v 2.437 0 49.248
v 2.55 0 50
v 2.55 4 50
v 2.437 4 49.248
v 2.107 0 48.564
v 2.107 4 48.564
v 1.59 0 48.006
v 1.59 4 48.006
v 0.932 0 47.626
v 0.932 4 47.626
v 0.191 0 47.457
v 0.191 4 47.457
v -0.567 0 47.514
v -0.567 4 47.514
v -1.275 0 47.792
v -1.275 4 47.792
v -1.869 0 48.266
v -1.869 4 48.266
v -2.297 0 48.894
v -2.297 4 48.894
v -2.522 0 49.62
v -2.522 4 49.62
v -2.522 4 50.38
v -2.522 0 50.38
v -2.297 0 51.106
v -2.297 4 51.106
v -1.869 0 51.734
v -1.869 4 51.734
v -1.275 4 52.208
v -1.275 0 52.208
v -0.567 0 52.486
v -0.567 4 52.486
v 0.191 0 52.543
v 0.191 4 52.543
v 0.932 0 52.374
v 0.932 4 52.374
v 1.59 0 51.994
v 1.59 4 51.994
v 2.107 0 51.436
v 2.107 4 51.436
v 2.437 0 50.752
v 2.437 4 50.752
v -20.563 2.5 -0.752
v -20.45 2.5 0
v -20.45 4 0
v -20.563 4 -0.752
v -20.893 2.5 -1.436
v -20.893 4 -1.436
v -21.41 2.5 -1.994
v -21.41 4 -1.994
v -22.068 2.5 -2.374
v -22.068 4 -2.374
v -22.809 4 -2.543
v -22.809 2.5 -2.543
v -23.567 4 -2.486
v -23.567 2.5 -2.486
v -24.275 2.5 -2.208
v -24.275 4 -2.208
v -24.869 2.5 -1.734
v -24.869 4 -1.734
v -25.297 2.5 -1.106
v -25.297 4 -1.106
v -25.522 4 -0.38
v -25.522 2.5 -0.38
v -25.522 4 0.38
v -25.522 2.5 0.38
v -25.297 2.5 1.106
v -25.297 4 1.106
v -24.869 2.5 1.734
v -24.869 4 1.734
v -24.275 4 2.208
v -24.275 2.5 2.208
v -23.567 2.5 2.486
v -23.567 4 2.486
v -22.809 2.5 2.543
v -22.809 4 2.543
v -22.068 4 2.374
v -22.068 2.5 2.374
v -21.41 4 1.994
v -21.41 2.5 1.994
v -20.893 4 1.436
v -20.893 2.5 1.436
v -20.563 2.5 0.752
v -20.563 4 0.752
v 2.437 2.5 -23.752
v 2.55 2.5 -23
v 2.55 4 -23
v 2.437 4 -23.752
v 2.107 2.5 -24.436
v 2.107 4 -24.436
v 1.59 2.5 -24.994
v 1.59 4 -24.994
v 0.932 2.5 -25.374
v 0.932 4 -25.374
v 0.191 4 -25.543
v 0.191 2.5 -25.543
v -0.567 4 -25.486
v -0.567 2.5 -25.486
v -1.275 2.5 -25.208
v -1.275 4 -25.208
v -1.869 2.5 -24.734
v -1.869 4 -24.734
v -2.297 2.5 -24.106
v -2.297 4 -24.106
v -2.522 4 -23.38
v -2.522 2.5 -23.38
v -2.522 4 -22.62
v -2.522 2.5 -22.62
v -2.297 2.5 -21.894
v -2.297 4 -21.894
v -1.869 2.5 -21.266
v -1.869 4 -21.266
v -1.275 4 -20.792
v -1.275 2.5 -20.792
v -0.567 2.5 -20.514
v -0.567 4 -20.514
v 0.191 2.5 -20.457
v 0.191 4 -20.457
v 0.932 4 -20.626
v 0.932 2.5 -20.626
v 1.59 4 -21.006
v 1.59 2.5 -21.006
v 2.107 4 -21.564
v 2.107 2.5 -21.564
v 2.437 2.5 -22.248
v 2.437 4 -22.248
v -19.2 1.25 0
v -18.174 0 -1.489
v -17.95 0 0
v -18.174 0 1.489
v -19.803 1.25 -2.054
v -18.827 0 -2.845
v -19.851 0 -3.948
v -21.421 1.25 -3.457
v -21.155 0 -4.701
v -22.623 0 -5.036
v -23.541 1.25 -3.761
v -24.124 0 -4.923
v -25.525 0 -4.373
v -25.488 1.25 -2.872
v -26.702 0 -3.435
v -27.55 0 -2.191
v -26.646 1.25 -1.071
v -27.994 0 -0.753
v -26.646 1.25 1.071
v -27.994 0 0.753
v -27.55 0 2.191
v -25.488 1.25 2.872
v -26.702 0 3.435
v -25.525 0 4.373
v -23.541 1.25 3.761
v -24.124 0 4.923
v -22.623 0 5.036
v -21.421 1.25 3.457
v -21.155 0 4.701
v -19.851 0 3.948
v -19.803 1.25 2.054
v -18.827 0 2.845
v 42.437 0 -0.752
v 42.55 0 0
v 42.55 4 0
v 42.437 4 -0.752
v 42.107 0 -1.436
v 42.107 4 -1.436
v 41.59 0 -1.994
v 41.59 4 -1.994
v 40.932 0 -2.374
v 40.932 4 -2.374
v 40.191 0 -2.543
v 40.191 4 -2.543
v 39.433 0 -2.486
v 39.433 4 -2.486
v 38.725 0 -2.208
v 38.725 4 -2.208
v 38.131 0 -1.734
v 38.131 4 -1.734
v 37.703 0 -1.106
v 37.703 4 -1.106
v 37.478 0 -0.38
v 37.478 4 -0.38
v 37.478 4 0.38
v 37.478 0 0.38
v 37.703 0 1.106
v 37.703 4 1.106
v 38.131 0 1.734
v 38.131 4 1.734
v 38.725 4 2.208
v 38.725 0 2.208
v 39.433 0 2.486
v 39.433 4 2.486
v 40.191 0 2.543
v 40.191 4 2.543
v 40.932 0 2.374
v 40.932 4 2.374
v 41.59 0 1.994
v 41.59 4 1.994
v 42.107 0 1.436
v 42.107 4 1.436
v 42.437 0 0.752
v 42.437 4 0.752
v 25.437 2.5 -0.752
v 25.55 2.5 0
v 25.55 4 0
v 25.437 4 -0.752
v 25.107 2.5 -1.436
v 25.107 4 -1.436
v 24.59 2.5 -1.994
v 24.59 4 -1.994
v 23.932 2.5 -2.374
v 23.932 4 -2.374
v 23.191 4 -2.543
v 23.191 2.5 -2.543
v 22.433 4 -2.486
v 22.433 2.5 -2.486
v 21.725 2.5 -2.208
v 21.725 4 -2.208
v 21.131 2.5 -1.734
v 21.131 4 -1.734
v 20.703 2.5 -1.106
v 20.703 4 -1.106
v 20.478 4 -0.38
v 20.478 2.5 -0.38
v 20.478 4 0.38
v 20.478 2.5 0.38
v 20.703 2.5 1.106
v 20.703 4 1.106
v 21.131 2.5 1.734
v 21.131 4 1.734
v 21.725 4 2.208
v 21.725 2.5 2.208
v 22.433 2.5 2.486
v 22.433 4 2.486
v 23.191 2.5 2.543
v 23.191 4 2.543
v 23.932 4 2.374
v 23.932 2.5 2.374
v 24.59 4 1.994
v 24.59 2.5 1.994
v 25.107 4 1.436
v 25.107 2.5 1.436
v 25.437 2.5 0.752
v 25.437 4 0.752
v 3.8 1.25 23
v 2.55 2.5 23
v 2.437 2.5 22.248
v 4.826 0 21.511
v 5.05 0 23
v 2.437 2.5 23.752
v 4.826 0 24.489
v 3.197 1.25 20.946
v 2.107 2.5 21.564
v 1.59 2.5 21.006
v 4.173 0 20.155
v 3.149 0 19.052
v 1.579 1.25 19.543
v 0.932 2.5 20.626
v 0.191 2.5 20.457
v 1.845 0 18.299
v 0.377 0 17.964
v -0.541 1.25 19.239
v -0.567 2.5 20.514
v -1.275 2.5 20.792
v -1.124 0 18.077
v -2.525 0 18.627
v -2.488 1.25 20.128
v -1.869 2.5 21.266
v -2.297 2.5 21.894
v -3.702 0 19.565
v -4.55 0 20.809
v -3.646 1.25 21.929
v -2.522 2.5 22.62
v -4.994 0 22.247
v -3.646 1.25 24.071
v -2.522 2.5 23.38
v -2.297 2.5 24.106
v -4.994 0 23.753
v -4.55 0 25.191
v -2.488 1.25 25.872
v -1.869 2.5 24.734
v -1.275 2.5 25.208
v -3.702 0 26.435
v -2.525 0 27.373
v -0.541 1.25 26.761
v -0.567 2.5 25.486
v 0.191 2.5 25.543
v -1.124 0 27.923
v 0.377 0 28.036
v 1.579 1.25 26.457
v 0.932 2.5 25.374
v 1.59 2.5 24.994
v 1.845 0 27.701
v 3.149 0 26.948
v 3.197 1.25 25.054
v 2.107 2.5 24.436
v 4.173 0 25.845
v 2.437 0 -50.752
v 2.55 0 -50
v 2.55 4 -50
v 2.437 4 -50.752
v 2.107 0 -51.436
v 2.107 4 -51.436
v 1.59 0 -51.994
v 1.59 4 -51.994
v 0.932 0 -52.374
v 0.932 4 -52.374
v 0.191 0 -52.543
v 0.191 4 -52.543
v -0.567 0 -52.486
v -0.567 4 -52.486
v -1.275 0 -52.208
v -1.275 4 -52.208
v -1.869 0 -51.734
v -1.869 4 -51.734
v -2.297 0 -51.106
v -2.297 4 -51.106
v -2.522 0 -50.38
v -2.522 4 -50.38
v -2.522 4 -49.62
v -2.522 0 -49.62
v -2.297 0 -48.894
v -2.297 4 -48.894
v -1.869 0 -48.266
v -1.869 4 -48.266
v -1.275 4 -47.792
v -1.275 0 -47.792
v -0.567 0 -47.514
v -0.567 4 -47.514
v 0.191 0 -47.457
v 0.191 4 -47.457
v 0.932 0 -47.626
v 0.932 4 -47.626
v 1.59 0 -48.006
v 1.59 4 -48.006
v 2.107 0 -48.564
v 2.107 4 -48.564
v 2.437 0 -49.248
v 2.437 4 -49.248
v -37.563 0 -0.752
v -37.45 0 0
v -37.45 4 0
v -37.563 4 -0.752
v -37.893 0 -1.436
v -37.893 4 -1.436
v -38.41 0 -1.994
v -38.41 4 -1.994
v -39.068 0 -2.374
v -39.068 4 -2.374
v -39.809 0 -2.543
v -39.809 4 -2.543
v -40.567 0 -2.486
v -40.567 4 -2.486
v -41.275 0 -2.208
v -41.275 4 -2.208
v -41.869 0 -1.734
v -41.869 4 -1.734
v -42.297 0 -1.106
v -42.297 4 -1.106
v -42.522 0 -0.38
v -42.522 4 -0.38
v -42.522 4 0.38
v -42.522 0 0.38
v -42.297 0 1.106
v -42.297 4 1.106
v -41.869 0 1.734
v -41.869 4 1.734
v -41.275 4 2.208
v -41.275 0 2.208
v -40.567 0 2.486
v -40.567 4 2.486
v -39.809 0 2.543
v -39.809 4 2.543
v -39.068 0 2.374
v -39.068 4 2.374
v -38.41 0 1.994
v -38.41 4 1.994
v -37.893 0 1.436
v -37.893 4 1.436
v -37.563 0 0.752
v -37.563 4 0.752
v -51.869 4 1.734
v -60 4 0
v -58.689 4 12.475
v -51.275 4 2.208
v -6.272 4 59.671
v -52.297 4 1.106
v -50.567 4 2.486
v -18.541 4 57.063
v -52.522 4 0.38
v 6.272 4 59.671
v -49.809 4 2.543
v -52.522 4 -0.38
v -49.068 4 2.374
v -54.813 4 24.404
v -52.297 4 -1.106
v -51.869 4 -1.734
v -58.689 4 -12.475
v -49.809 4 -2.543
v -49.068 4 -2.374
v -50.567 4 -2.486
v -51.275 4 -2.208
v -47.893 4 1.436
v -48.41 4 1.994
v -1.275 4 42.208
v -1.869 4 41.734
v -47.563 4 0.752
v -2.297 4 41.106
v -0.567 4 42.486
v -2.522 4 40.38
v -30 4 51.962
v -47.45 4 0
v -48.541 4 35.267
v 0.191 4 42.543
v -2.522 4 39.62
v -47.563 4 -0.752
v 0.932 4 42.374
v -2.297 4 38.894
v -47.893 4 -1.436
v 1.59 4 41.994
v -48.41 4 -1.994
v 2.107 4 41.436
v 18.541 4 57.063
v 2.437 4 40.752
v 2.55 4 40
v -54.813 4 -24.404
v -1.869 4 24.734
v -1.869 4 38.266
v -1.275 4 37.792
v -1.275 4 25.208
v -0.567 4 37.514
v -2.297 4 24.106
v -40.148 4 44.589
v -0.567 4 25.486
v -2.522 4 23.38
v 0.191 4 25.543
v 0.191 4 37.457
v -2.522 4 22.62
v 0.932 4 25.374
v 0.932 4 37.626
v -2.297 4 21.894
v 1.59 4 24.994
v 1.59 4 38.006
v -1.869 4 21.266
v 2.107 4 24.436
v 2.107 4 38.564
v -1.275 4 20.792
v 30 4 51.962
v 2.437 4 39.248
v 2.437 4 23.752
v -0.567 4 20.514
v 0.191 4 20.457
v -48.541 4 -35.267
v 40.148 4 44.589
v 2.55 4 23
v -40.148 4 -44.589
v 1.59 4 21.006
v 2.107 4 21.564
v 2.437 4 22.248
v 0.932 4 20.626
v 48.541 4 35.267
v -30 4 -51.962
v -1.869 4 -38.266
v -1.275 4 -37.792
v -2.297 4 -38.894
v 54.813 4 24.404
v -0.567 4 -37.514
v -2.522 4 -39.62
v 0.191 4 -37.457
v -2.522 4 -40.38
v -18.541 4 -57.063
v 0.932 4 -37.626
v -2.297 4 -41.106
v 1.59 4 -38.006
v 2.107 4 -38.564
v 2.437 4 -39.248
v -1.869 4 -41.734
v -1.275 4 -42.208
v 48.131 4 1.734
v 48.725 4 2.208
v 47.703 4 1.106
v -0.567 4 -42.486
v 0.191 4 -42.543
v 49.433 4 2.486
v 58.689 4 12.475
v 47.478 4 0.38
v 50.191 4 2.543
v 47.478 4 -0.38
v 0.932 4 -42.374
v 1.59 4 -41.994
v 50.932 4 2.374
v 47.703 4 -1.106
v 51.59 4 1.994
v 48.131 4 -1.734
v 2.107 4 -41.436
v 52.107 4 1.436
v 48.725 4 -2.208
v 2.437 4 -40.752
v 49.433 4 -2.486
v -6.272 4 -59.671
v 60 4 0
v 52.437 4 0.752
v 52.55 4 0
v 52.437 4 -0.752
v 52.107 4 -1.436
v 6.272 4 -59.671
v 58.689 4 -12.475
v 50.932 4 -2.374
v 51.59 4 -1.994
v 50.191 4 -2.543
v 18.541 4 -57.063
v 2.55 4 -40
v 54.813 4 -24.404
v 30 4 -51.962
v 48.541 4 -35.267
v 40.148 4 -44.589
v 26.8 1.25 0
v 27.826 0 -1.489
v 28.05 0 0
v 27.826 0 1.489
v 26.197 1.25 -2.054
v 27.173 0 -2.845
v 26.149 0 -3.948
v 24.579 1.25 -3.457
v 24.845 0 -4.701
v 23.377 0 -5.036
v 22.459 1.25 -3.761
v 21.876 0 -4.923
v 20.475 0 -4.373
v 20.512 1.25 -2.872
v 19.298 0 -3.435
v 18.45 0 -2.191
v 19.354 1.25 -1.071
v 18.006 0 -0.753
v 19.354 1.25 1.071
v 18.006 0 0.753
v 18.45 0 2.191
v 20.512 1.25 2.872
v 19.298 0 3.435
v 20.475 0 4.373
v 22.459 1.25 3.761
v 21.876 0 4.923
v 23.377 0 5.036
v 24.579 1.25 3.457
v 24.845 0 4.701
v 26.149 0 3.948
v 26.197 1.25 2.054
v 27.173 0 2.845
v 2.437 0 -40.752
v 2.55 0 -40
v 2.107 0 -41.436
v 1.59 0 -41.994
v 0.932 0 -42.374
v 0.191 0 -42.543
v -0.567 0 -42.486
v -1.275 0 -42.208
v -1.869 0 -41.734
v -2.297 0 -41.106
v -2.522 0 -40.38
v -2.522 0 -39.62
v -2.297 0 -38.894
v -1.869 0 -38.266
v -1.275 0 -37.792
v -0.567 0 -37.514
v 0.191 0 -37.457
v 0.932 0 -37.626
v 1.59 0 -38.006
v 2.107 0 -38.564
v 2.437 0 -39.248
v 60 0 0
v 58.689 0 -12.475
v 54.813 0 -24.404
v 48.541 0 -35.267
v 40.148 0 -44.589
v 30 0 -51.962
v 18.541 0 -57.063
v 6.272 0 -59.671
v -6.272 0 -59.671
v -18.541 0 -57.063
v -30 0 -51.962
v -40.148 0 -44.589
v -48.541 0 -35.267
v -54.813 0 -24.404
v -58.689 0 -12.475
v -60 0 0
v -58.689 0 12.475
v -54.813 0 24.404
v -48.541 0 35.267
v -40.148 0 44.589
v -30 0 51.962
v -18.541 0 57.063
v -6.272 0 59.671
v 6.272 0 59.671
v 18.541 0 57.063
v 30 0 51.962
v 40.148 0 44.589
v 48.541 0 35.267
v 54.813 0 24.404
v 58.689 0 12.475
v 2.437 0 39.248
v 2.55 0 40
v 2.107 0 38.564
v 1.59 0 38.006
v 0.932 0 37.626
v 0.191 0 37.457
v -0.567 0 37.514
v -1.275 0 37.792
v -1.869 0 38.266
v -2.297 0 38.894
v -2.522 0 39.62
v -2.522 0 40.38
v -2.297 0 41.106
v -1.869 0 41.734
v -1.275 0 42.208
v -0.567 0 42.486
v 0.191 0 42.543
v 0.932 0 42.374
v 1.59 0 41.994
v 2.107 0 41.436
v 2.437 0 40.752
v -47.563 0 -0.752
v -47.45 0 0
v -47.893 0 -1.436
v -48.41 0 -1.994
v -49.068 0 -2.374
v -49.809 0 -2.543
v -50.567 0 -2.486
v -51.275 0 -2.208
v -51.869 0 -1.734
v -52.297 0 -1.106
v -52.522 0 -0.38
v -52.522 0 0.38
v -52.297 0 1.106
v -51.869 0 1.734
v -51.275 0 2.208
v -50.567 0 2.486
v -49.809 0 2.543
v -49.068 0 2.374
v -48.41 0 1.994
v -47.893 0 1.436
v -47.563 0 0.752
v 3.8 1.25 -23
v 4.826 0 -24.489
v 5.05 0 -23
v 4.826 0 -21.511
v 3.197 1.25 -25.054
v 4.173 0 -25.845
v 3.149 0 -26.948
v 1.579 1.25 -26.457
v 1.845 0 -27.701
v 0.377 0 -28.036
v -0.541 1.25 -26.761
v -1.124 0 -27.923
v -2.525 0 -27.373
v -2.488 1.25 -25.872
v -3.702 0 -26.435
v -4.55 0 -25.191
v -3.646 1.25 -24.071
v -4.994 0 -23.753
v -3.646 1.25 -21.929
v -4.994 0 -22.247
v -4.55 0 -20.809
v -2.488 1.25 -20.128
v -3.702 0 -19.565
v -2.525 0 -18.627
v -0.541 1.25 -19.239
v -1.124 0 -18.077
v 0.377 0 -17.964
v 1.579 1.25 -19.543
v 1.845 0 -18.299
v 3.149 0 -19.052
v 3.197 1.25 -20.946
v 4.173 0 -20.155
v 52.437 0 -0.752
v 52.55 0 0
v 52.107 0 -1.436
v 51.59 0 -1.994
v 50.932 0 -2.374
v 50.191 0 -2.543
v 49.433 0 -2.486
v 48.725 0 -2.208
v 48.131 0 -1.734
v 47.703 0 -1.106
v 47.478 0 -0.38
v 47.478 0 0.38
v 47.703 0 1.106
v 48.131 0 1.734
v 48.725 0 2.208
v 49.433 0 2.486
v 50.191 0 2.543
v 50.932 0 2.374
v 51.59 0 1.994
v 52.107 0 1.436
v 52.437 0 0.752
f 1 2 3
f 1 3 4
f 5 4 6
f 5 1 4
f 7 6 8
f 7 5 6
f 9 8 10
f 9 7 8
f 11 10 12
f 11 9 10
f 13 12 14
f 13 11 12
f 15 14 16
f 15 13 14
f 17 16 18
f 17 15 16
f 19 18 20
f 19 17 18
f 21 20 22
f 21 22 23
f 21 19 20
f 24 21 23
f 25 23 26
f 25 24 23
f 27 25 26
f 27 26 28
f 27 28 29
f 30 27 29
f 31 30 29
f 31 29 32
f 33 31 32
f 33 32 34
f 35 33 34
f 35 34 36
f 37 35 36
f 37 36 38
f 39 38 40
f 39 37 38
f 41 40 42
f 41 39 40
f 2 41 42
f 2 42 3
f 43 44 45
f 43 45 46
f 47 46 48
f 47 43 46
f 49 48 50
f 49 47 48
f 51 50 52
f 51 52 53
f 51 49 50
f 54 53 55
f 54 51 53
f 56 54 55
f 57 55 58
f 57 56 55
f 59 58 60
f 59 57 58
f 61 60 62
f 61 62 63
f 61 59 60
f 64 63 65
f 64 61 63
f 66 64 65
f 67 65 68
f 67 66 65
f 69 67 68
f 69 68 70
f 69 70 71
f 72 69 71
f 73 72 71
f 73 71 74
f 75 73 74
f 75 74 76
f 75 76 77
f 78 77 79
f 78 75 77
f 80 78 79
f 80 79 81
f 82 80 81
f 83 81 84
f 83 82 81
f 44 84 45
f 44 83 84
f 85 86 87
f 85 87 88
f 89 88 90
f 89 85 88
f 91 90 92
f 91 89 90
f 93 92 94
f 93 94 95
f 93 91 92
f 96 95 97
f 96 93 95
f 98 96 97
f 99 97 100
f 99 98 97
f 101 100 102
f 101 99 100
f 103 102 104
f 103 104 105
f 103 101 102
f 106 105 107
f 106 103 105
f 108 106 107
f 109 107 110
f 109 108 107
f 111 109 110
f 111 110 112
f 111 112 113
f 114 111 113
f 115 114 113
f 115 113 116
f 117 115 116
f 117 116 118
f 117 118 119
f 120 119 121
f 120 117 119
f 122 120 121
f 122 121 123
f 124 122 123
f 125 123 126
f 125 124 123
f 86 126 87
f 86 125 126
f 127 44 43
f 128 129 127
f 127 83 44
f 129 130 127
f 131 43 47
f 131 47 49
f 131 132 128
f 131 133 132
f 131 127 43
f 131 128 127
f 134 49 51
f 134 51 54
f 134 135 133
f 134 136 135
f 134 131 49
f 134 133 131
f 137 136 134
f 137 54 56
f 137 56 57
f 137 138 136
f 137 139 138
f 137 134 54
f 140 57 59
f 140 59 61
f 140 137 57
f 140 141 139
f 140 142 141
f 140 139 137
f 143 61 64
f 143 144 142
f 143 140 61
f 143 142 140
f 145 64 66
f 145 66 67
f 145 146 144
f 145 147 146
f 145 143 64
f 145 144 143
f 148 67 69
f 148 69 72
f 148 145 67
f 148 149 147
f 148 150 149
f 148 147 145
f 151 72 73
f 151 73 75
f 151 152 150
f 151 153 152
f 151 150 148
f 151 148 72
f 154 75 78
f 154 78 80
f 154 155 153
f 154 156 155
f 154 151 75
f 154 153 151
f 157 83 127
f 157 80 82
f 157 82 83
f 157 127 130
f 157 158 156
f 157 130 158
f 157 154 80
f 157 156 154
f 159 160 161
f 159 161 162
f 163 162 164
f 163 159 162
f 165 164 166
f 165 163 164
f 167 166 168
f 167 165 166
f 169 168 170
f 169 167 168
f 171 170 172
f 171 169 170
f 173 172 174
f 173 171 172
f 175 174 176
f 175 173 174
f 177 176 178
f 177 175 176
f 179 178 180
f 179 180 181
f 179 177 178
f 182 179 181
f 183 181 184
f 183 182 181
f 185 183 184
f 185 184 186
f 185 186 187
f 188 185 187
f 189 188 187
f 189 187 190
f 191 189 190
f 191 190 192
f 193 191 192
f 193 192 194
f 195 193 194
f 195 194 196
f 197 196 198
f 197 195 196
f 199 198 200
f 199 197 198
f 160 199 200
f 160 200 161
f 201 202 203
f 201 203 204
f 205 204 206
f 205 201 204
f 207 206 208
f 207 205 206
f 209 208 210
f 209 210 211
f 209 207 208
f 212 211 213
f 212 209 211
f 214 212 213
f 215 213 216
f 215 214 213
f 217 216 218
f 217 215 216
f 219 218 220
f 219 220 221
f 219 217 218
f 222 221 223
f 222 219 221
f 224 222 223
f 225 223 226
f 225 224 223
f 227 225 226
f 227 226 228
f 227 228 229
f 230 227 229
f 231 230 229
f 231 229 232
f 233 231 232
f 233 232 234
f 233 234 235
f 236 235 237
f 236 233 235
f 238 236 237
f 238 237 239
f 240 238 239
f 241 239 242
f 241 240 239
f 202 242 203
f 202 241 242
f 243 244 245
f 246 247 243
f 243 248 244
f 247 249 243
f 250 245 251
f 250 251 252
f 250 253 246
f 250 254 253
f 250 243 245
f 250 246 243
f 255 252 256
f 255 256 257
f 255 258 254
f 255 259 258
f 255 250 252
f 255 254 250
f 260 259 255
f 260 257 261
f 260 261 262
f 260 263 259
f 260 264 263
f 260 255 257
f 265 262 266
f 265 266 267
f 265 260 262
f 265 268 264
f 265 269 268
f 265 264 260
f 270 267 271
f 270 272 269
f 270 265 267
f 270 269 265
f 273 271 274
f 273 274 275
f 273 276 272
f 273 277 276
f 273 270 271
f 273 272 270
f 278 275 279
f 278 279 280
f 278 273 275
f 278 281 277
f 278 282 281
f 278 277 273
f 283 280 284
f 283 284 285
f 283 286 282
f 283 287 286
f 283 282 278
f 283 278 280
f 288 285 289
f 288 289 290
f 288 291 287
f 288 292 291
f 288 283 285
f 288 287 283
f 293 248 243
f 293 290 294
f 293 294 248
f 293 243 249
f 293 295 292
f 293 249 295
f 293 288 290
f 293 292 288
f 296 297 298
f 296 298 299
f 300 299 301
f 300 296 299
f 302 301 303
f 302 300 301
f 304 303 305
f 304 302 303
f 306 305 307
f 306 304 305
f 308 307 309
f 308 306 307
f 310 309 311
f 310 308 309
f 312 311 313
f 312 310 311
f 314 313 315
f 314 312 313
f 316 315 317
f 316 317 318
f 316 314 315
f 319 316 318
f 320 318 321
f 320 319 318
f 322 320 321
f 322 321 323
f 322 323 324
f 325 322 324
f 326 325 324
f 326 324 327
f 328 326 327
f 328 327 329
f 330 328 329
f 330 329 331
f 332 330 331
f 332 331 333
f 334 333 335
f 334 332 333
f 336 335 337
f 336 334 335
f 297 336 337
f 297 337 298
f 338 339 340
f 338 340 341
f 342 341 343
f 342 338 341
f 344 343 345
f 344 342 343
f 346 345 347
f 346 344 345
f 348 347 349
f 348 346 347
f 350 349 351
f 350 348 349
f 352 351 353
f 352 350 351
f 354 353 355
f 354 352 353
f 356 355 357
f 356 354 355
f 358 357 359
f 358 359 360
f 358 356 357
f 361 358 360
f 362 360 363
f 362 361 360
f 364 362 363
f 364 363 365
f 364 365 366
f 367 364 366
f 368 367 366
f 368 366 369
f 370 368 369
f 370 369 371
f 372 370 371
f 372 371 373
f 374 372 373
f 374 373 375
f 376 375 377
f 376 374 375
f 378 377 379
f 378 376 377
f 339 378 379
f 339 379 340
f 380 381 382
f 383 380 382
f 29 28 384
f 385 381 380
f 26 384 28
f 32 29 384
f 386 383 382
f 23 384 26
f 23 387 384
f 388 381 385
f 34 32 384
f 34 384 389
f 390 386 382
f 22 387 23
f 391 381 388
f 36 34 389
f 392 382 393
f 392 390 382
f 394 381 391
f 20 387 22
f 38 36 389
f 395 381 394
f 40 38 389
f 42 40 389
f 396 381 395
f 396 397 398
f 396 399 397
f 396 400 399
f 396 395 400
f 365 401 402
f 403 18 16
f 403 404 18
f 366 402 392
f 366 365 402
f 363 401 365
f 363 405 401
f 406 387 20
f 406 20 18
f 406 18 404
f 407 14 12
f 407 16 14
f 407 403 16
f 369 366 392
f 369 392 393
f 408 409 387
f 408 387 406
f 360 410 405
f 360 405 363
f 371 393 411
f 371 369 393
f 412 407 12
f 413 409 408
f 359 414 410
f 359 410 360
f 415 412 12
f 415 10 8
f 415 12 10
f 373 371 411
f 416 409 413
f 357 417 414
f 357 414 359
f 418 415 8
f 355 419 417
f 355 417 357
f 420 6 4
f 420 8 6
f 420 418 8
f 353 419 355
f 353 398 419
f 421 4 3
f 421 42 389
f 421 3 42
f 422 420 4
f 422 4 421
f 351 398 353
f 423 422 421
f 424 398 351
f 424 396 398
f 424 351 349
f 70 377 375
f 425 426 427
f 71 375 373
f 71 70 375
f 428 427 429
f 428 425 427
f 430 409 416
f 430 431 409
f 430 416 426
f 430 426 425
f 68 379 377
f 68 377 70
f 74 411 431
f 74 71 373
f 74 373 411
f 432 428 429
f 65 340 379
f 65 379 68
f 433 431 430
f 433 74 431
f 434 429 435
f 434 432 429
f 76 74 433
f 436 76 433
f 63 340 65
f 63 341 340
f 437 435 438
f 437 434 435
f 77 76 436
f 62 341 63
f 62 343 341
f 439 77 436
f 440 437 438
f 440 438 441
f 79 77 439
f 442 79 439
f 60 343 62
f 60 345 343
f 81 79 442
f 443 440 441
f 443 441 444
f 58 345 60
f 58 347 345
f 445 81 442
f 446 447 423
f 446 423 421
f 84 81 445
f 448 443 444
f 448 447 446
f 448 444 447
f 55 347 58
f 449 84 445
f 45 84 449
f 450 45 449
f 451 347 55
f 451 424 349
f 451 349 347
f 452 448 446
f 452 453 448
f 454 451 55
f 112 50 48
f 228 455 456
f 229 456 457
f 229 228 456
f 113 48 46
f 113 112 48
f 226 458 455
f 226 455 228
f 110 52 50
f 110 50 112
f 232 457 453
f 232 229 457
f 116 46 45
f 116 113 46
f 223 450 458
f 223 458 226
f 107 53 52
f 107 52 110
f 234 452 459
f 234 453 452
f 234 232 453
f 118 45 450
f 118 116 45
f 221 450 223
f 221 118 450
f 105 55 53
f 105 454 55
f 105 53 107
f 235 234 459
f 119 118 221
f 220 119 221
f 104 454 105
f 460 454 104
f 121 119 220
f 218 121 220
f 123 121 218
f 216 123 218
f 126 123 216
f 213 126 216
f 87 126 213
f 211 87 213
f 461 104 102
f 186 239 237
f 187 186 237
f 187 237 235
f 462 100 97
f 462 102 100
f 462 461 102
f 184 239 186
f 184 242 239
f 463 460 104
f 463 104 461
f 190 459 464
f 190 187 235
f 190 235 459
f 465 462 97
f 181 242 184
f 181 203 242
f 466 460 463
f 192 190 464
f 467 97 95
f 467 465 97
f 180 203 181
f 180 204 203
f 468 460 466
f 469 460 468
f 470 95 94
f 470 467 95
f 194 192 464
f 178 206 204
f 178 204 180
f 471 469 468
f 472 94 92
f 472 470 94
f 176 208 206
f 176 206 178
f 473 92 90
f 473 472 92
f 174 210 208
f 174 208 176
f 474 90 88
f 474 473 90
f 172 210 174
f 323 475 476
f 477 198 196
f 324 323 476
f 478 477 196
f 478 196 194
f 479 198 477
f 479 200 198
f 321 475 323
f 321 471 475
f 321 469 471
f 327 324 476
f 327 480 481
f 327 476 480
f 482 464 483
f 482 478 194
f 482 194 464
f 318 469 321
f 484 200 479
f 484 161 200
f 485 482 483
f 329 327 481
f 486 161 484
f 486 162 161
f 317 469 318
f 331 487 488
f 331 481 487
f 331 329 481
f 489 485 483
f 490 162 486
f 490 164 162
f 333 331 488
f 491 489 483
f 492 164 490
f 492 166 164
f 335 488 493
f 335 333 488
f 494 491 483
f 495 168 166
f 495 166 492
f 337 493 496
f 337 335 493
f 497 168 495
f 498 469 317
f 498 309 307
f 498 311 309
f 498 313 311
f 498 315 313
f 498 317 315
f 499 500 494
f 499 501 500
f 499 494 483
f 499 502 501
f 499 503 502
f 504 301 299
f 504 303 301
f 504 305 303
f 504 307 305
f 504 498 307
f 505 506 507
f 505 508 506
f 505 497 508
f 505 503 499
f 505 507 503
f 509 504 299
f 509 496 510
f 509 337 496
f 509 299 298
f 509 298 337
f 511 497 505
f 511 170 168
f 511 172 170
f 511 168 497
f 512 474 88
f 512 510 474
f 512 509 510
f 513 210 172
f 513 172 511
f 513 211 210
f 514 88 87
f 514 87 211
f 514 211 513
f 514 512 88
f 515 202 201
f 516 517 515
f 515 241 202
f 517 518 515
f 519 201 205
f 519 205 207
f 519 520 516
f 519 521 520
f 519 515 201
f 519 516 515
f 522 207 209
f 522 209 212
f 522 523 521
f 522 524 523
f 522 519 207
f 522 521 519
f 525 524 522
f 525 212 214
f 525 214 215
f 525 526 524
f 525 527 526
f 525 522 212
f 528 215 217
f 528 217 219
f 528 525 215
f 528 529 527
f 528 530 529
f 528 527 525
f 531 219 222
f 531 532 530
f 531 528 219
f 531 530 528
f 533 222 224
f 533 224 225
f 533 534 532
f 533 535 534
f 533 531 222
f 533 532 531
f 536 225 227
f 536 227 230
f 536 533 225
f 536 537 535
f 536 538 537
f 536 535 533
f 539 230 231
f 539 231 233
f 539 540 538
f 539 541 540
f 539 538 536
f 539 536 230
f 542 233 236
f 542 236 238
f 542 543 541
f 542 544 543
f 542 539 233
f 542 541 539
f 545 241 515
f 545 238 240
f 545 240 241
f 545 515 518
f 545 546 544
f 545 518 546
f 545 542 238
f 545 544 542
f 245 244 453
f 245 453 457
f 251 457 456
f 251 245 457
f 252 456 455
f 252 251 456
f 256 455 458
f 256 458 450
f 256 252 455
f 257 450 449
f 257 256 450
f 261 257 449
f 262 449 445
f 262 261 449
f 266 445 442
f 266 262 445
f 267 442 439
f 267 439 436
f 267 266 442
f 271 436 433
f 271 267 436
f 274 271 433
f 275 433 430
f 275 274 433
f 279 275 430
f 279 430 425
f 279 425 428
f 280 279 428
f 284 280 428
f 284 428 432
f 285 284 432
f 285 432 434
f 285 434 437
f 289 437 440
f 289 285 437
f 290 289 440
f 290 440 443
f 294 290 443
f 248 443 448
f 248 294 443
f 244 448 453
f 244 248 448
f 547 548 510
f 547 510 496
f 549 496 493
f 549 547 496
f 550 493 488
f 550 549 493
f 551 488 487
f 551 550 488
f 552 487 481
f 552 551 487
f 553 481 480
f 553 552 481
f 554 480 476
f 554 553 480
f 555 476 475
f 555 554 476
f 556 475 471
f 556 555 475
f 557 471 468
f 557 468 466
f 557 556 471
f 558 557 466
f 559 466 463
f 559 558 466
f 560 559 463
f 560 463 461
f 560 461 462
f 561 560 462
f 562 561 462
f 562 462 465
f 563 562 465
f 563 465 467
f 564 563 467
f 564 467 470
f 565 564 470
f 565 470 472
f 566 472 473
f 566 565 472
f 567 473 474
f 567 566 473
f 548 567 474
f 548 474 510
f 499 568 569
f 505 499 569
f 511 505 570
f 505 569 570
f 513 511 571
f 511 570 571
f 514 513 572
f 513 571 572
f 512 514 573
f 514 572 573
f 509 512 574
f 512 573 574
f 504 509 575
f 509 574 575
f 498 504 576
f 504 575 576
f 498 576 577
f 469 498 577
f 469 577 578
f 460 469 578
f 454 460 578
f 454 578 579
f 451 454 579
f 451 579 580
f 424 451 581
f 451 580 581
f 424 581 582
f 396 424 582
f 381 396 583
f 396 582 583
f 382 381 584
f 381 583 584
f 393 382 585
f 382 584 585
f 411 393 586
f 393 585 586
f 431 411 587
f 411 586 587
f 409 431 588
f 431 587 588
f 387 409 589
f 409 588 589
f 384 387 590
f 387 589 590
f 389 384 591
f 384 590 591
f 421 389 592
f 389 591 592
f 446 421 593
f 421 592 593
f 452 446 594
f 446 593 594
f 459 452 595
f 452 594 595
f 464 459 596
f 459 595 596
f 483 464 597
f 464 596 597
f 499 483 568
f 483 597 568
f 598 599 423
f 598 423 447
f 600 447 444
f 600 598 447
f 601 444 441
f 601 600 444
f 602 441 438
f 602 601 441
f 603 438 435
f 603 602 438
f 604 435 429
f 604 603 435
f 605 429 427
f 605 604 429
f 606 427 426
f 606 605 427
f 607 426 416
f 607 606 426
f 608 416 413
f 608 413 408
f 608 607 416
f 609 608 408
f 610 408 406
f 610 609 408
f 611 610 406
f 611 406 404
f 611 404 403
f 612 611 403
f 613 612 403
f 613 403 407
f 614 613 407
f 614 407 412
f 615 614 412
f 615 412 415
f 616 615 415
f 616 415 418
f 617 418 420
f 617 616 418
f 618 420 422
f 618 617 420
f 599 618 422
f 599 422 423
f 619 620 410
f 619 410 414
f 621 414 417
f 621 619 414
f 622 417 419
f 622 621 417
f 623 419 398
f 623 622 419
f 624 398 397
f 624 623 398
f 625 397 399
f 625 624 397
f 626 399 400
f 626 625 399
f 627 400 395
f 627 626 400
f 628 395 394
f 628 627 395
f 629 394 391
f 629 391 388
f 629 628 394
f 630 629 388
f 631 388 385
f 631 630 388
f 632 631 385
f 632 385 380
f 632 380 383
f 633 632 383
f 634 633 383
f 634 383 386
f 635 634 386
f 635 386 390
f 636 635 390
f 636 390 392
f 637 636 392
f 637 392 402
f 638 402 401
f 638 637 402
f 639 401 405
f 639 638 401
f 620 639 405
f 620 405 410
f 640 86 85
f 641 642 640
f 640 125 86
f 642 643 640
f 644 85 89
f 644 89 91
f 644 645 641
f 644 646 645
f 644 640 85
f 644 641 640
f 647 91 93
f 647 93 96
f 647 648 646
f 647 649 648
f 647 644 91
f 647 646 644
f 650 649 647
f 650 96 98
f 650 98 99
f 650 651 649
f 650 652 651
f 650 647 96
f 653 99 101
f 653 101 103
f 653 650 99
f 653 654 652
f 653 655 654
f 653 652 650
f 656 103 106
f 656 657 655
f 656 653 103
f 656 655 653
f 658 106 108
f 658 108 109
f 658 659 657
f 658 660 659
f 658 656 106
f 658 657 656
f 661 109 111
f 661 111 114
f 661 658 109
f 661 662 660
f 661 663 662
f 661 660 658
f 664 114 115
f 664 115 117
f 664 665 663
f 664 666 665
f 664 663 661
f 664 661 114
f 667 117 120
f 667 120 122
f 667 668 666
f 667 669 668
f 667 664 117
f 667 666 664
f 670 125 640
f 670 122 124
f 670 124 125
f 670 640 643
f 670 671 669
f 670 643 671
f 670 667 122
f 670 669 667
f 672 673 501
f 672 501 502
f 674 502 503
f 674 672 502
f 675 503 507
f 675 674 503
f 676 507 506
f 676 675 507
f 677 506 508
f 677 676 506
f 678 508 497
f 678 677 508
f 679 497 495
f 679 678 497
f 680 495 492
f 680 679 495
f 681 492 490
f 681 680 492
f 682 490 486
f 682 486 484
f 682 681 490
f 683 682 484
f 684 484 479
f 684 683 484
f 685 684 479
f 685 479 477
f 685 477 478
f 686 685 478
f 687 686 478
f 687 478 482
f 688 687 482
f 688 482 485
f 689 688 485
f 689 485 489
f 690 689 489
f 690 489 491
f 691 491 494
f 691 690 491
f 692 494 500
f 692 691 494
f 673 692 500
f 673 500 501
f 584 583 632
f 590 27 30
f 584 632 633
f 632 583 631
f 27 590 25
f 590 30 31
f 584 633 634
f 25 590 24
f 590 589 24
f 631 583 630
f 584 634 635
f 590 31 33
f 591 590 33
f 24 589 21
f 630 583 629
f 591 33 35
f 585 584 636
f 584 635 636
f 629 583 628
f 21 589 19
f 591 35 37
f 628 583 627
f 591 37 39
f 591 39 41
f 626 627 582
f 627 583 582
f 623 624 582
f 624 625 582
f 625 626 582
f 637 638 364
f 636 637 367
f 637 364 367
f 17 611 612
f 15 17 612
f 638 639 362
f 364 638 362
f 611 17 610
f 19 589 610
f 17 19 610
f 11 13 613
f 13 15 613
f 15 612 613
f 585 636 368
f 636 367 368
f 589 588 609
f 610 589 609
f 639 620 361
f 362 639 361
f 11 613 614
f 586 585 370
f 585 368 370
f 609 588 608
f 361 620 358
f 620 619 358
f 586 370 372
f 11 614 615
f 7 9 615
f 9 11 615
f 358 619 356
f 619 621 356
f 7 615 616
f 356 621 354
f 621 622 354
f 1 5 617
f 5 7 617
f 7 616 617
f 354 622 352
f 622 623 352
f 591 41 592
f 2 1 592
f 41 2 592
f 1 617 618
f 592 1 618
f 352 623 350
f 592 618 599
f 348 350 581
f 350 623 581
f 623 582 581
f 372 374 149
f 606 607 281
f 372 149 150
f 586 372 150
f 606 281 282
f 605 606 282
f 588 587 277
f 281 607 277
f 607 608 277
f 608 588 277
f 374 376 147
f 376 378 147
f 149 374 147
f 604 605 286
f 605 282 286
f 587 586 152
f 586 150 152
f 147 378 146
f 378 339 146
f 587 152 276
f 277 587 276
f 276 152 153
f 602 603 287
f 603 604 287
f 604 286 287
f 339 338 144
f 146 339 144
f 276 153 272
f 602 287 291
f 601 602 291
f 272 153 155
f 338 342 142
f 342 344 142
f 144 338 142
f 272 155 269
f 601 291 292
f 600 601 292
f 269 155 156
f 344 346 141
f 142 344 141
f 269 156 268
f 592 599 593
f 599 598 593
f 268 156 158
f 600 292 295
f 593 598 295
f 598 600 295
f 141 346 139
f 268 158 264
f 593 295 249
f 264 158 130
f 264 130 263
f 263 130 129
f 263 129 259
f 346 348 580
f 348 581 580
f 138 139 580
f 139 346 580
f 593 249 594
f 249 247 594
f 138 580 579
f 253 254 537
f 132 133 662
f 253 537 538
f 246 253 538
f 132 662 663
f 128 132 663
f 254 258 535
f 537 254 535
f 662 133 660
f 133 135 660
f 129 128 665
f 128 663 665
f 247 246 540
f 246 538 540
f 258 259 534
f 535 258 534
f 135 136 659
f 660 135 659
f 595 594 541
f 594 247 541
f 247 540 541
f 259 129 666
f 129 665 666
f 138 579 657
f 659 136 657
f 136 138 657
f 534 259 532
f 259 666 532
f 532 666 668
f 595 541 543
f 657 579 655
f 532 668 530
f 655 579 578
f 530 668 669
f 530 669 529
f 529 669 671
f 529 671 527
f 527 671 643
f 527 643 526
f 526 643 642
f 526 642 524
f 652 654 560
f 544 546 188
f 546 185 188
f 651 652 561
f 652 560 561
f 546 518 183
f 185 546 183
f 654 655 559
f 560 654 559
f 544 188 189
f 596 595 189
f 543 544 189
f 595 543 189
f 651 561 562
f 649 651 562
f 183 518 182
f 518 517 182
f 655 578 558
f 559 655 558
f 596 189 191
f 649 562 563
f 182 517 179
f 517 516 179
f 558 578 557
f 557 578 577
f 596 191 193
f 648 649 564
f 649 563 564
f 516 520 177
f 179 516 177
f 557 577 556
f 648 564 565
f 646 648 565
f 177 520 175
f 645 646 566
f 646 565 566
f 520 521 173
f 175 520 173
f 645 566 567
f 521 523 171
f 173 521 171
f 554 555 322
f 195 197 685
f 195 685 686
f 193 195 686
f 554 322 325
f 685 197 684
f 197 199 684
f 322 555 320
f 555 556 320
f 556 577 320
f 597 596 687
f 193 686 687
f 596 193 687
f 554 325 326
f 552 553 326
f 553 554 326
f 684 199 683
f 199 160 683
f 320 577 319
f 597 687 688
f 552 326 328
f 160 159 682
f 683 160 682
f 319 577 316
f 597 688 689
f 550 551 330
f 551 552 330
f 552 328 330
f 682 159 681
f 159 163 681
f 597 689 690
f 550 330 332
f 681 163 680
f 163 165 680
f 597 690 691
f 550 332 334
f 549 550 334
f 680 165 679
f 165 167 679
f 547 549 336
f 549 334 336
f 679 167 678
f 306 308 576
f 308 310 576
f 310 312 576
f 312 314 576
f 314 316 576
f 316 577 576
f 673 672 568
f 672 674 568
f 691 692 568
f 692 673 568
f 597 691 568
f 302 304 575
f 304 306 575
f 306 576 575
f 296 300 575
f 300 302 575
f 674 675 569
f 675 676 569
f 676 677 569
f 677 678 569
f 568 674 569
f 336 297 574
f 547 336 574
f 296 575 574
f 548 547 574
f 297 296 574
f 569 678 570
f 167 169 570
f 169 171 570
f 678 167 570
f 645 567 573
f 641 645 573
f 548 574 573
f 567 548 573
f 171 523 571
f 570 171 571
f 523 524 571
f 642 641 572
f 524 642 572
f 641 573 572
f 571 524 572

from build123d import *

# Parameters (mm, degrees)
SKETCH_1_R      = 60
SKETCH_1_R_2    = 2.55
EXTRUDE_1_DEPTH = 4
CHAMFER_1_SIZE  = 2.5


with BuildPart() as part:
    # 草图1 → 凸台-拉伸1 (new body)
    with BuildSketch(Plane(origin=(0, 0, 0), x_dir=(1, 0, 0), z_dir=(0, 1, 0))):
        Circle(SKETCH_1_R)
        with Locations((0, 50)):
            Circle(SKETCH_1_R_2, mode=Mode.SUBTRACT)
        with Locations((50, 0)):
            Circle(SKETCH_1_R_2, mode=Mode.SUBTRACT)
        with Locations((0, -50)):
            Circle(SKETCH_1_R_2, mode=Mode.SUBTRACT)
        with Locations((-50, 0)):
            Circle(SKETCH_1_R_2, mode=Mode.SUBTRACT)
        with Locations((0, 40)):
            Circle(SKETCH_1_R_2, mode=Mode.SUBTRACT)
        with Locations((40, 0)):
            Circle(SKETCH_1_R_2, mode=Mode.SUBTRACT)
        with Locations((0, -40)):
            Circle(SKETCH_1_R_2, mode=Mode.SUBTRACT)
        with Locations((-40, 0)):
            Circle(SKETCH_1_R_2, mode=Mode.SUBTRACT)
        with Locations((0, 23)):
            Circle(SKETCH_1_R_2, mode=Mode.SUBTRACT)
        with Locations((23, 0)):
            Circle(SKETCH_1_R_2, mode=Mode.SUBTRACT)
        with Locations((0, -23)):
            Circle(SKETCH_1_R_2, mode=Mode.SUBTRACT)
        with Locations((-23, 0)):
            Circle(SKETCH_1_R_2, mode=Mode.SUBTRACT)
    extrude(amount=EXTRUDE_1_DEPTH)

    # 倒角1
    chamfer_1_edges = [part.edges().sort_by_distance(p)[0] for p in [
        (-2.55, 0, -23),
        (20.45, 0, 0),
        (-2.55, 0, 23),
        (-25.55, 0, 0),
    ]]
    chamfer(chamfer_1_edges, length=CHAMFER_1_SIZE)


solid = part.part
